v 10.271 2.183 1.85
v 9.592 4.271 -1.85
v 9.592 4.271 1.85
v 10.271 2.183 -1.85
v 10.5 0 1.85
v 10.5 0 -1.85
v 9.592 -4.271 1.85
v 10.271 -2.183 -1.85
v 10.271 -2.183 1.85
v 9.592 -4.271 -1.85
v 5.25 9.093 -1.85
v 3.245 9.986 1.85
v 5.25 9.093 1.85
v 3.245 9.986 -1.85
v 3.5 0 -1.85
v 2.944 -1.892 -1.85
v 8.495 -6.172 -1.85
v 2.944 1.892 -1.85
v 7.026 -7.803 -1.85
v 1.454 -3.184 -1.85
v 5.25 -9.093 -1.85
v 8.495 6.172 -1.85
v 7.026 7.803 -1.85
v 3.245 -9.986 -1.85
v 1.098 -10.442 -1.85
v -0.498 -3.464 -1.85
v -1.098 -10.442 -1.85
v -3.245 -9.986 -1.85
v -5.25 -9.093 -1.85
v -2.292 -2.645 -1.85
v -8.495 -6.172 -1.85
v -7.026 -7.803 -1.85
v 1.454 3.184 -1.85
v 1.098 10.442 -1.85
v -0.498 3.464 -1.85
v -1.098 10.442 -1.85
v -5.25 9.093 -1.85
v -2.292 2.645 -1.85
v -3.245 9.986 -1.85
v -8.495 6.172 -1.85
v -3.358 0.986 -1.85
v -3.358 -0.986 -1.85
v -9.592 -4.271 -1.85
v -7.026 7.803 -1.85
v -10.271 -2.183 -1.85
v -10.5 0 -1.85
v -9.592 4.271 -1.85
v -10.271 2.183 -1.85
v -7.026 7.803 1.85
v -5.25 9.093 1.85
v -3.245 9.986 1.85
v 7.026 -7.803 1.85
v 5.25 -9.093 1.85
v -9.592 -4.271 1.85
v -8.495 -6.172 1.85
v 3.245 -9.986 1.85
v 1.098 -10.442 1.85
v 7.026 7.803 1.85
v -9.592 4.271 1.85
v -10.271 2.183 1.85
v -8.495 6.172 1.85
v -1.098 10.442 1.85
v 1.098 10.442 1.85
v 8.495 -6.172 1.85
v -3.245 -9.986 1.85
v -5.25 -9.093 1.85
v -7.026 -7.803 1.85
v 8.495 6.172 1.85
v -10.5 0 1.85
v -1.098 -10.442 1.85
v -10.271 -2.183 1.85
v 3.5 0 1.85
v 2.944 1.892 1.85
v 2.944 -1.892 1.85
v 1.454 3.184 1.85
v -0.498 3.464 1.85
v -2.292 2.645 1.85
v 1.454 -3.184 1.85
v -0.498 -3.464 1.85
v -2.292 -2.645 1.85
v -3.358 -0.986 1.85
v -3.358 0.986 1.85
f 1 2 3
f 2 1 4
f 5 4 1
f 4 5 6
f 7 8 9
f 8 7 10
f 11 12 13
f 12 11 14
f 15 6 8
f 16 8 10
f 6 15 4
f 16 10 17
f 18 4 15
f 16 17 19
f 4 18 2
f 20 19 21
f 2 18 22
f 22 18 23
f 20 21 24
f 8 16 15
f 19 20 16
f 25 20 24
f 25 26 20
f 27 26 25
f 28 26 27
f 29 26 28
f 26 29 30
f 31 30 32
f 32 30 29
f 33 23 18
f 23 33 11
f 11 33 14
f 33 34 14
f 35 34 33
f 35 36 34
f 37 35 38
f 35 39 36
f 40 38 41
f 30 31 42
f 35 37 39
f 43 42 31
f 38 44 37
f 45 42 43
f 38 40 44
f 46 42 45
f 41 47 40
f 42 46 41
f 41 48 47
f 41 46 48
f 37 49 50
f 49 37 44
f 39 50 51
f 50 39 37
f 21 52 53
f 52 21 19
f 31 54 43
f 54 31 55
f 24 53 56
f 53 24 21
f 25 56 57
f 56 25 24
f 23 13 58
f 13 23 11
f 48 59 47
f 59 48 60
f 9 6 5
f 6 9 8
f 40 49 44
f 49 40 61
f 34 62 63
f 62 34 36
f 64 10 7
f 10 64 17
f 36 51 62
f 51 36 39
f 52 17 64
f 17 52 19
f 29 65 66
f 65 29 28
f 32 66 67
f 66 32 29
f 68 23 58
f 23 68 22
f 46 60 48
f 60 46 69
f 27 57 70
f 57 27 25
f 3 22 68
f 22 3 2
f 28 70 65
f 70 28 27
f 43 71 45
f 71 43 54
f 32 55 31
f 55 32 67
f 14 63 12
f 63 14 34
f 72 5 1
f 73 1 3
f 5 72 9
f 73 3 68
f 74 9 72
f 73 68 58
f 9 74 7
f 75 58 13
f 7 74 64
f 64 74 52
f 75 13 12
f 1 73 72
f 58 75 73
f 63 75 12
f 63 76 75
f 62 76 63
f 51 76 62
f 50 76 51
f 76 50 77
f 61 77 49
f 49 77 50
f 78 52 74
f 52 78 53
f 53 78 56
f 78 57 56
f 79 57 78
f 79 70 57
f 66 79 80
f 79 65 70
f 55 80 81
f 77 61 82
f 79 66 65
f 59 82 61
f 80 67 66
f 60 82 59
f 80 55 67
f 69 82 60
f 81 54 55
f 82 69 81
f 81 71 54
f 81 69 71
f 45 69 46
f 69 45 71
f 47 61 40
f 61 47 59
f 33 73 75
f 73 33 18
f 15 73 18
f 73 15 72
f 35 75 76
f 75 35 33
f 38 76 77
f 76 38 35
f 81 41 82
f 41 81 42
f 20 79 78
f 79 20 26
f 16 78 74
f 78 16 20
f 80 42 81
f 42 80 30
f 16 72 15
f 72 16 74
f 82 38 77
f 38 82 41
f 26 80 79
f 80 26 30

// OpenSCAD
// Parameters
outer_radius = 10.5; //[5.25:21:0.1]
inner_radius = 3.5; //[1.75:7:0.1]
height = 3.7; //[1.85:7.4:0.1]
bore_clearance = 0.5; //[0.2:2:0.1]

// Geometry
module radial_body() {
  cylinder(h=height, r=outer_radius, center=true);
}

module center_bore() {
  cylinder(h=height + 2*bore_clearance, r=inner_radius, center=true);
}

// Final Model
module ring_model() {
  difference() {
    radial_body();
    center_bore();
  }
}

// Render the final output
color("Silver") ring_model();
